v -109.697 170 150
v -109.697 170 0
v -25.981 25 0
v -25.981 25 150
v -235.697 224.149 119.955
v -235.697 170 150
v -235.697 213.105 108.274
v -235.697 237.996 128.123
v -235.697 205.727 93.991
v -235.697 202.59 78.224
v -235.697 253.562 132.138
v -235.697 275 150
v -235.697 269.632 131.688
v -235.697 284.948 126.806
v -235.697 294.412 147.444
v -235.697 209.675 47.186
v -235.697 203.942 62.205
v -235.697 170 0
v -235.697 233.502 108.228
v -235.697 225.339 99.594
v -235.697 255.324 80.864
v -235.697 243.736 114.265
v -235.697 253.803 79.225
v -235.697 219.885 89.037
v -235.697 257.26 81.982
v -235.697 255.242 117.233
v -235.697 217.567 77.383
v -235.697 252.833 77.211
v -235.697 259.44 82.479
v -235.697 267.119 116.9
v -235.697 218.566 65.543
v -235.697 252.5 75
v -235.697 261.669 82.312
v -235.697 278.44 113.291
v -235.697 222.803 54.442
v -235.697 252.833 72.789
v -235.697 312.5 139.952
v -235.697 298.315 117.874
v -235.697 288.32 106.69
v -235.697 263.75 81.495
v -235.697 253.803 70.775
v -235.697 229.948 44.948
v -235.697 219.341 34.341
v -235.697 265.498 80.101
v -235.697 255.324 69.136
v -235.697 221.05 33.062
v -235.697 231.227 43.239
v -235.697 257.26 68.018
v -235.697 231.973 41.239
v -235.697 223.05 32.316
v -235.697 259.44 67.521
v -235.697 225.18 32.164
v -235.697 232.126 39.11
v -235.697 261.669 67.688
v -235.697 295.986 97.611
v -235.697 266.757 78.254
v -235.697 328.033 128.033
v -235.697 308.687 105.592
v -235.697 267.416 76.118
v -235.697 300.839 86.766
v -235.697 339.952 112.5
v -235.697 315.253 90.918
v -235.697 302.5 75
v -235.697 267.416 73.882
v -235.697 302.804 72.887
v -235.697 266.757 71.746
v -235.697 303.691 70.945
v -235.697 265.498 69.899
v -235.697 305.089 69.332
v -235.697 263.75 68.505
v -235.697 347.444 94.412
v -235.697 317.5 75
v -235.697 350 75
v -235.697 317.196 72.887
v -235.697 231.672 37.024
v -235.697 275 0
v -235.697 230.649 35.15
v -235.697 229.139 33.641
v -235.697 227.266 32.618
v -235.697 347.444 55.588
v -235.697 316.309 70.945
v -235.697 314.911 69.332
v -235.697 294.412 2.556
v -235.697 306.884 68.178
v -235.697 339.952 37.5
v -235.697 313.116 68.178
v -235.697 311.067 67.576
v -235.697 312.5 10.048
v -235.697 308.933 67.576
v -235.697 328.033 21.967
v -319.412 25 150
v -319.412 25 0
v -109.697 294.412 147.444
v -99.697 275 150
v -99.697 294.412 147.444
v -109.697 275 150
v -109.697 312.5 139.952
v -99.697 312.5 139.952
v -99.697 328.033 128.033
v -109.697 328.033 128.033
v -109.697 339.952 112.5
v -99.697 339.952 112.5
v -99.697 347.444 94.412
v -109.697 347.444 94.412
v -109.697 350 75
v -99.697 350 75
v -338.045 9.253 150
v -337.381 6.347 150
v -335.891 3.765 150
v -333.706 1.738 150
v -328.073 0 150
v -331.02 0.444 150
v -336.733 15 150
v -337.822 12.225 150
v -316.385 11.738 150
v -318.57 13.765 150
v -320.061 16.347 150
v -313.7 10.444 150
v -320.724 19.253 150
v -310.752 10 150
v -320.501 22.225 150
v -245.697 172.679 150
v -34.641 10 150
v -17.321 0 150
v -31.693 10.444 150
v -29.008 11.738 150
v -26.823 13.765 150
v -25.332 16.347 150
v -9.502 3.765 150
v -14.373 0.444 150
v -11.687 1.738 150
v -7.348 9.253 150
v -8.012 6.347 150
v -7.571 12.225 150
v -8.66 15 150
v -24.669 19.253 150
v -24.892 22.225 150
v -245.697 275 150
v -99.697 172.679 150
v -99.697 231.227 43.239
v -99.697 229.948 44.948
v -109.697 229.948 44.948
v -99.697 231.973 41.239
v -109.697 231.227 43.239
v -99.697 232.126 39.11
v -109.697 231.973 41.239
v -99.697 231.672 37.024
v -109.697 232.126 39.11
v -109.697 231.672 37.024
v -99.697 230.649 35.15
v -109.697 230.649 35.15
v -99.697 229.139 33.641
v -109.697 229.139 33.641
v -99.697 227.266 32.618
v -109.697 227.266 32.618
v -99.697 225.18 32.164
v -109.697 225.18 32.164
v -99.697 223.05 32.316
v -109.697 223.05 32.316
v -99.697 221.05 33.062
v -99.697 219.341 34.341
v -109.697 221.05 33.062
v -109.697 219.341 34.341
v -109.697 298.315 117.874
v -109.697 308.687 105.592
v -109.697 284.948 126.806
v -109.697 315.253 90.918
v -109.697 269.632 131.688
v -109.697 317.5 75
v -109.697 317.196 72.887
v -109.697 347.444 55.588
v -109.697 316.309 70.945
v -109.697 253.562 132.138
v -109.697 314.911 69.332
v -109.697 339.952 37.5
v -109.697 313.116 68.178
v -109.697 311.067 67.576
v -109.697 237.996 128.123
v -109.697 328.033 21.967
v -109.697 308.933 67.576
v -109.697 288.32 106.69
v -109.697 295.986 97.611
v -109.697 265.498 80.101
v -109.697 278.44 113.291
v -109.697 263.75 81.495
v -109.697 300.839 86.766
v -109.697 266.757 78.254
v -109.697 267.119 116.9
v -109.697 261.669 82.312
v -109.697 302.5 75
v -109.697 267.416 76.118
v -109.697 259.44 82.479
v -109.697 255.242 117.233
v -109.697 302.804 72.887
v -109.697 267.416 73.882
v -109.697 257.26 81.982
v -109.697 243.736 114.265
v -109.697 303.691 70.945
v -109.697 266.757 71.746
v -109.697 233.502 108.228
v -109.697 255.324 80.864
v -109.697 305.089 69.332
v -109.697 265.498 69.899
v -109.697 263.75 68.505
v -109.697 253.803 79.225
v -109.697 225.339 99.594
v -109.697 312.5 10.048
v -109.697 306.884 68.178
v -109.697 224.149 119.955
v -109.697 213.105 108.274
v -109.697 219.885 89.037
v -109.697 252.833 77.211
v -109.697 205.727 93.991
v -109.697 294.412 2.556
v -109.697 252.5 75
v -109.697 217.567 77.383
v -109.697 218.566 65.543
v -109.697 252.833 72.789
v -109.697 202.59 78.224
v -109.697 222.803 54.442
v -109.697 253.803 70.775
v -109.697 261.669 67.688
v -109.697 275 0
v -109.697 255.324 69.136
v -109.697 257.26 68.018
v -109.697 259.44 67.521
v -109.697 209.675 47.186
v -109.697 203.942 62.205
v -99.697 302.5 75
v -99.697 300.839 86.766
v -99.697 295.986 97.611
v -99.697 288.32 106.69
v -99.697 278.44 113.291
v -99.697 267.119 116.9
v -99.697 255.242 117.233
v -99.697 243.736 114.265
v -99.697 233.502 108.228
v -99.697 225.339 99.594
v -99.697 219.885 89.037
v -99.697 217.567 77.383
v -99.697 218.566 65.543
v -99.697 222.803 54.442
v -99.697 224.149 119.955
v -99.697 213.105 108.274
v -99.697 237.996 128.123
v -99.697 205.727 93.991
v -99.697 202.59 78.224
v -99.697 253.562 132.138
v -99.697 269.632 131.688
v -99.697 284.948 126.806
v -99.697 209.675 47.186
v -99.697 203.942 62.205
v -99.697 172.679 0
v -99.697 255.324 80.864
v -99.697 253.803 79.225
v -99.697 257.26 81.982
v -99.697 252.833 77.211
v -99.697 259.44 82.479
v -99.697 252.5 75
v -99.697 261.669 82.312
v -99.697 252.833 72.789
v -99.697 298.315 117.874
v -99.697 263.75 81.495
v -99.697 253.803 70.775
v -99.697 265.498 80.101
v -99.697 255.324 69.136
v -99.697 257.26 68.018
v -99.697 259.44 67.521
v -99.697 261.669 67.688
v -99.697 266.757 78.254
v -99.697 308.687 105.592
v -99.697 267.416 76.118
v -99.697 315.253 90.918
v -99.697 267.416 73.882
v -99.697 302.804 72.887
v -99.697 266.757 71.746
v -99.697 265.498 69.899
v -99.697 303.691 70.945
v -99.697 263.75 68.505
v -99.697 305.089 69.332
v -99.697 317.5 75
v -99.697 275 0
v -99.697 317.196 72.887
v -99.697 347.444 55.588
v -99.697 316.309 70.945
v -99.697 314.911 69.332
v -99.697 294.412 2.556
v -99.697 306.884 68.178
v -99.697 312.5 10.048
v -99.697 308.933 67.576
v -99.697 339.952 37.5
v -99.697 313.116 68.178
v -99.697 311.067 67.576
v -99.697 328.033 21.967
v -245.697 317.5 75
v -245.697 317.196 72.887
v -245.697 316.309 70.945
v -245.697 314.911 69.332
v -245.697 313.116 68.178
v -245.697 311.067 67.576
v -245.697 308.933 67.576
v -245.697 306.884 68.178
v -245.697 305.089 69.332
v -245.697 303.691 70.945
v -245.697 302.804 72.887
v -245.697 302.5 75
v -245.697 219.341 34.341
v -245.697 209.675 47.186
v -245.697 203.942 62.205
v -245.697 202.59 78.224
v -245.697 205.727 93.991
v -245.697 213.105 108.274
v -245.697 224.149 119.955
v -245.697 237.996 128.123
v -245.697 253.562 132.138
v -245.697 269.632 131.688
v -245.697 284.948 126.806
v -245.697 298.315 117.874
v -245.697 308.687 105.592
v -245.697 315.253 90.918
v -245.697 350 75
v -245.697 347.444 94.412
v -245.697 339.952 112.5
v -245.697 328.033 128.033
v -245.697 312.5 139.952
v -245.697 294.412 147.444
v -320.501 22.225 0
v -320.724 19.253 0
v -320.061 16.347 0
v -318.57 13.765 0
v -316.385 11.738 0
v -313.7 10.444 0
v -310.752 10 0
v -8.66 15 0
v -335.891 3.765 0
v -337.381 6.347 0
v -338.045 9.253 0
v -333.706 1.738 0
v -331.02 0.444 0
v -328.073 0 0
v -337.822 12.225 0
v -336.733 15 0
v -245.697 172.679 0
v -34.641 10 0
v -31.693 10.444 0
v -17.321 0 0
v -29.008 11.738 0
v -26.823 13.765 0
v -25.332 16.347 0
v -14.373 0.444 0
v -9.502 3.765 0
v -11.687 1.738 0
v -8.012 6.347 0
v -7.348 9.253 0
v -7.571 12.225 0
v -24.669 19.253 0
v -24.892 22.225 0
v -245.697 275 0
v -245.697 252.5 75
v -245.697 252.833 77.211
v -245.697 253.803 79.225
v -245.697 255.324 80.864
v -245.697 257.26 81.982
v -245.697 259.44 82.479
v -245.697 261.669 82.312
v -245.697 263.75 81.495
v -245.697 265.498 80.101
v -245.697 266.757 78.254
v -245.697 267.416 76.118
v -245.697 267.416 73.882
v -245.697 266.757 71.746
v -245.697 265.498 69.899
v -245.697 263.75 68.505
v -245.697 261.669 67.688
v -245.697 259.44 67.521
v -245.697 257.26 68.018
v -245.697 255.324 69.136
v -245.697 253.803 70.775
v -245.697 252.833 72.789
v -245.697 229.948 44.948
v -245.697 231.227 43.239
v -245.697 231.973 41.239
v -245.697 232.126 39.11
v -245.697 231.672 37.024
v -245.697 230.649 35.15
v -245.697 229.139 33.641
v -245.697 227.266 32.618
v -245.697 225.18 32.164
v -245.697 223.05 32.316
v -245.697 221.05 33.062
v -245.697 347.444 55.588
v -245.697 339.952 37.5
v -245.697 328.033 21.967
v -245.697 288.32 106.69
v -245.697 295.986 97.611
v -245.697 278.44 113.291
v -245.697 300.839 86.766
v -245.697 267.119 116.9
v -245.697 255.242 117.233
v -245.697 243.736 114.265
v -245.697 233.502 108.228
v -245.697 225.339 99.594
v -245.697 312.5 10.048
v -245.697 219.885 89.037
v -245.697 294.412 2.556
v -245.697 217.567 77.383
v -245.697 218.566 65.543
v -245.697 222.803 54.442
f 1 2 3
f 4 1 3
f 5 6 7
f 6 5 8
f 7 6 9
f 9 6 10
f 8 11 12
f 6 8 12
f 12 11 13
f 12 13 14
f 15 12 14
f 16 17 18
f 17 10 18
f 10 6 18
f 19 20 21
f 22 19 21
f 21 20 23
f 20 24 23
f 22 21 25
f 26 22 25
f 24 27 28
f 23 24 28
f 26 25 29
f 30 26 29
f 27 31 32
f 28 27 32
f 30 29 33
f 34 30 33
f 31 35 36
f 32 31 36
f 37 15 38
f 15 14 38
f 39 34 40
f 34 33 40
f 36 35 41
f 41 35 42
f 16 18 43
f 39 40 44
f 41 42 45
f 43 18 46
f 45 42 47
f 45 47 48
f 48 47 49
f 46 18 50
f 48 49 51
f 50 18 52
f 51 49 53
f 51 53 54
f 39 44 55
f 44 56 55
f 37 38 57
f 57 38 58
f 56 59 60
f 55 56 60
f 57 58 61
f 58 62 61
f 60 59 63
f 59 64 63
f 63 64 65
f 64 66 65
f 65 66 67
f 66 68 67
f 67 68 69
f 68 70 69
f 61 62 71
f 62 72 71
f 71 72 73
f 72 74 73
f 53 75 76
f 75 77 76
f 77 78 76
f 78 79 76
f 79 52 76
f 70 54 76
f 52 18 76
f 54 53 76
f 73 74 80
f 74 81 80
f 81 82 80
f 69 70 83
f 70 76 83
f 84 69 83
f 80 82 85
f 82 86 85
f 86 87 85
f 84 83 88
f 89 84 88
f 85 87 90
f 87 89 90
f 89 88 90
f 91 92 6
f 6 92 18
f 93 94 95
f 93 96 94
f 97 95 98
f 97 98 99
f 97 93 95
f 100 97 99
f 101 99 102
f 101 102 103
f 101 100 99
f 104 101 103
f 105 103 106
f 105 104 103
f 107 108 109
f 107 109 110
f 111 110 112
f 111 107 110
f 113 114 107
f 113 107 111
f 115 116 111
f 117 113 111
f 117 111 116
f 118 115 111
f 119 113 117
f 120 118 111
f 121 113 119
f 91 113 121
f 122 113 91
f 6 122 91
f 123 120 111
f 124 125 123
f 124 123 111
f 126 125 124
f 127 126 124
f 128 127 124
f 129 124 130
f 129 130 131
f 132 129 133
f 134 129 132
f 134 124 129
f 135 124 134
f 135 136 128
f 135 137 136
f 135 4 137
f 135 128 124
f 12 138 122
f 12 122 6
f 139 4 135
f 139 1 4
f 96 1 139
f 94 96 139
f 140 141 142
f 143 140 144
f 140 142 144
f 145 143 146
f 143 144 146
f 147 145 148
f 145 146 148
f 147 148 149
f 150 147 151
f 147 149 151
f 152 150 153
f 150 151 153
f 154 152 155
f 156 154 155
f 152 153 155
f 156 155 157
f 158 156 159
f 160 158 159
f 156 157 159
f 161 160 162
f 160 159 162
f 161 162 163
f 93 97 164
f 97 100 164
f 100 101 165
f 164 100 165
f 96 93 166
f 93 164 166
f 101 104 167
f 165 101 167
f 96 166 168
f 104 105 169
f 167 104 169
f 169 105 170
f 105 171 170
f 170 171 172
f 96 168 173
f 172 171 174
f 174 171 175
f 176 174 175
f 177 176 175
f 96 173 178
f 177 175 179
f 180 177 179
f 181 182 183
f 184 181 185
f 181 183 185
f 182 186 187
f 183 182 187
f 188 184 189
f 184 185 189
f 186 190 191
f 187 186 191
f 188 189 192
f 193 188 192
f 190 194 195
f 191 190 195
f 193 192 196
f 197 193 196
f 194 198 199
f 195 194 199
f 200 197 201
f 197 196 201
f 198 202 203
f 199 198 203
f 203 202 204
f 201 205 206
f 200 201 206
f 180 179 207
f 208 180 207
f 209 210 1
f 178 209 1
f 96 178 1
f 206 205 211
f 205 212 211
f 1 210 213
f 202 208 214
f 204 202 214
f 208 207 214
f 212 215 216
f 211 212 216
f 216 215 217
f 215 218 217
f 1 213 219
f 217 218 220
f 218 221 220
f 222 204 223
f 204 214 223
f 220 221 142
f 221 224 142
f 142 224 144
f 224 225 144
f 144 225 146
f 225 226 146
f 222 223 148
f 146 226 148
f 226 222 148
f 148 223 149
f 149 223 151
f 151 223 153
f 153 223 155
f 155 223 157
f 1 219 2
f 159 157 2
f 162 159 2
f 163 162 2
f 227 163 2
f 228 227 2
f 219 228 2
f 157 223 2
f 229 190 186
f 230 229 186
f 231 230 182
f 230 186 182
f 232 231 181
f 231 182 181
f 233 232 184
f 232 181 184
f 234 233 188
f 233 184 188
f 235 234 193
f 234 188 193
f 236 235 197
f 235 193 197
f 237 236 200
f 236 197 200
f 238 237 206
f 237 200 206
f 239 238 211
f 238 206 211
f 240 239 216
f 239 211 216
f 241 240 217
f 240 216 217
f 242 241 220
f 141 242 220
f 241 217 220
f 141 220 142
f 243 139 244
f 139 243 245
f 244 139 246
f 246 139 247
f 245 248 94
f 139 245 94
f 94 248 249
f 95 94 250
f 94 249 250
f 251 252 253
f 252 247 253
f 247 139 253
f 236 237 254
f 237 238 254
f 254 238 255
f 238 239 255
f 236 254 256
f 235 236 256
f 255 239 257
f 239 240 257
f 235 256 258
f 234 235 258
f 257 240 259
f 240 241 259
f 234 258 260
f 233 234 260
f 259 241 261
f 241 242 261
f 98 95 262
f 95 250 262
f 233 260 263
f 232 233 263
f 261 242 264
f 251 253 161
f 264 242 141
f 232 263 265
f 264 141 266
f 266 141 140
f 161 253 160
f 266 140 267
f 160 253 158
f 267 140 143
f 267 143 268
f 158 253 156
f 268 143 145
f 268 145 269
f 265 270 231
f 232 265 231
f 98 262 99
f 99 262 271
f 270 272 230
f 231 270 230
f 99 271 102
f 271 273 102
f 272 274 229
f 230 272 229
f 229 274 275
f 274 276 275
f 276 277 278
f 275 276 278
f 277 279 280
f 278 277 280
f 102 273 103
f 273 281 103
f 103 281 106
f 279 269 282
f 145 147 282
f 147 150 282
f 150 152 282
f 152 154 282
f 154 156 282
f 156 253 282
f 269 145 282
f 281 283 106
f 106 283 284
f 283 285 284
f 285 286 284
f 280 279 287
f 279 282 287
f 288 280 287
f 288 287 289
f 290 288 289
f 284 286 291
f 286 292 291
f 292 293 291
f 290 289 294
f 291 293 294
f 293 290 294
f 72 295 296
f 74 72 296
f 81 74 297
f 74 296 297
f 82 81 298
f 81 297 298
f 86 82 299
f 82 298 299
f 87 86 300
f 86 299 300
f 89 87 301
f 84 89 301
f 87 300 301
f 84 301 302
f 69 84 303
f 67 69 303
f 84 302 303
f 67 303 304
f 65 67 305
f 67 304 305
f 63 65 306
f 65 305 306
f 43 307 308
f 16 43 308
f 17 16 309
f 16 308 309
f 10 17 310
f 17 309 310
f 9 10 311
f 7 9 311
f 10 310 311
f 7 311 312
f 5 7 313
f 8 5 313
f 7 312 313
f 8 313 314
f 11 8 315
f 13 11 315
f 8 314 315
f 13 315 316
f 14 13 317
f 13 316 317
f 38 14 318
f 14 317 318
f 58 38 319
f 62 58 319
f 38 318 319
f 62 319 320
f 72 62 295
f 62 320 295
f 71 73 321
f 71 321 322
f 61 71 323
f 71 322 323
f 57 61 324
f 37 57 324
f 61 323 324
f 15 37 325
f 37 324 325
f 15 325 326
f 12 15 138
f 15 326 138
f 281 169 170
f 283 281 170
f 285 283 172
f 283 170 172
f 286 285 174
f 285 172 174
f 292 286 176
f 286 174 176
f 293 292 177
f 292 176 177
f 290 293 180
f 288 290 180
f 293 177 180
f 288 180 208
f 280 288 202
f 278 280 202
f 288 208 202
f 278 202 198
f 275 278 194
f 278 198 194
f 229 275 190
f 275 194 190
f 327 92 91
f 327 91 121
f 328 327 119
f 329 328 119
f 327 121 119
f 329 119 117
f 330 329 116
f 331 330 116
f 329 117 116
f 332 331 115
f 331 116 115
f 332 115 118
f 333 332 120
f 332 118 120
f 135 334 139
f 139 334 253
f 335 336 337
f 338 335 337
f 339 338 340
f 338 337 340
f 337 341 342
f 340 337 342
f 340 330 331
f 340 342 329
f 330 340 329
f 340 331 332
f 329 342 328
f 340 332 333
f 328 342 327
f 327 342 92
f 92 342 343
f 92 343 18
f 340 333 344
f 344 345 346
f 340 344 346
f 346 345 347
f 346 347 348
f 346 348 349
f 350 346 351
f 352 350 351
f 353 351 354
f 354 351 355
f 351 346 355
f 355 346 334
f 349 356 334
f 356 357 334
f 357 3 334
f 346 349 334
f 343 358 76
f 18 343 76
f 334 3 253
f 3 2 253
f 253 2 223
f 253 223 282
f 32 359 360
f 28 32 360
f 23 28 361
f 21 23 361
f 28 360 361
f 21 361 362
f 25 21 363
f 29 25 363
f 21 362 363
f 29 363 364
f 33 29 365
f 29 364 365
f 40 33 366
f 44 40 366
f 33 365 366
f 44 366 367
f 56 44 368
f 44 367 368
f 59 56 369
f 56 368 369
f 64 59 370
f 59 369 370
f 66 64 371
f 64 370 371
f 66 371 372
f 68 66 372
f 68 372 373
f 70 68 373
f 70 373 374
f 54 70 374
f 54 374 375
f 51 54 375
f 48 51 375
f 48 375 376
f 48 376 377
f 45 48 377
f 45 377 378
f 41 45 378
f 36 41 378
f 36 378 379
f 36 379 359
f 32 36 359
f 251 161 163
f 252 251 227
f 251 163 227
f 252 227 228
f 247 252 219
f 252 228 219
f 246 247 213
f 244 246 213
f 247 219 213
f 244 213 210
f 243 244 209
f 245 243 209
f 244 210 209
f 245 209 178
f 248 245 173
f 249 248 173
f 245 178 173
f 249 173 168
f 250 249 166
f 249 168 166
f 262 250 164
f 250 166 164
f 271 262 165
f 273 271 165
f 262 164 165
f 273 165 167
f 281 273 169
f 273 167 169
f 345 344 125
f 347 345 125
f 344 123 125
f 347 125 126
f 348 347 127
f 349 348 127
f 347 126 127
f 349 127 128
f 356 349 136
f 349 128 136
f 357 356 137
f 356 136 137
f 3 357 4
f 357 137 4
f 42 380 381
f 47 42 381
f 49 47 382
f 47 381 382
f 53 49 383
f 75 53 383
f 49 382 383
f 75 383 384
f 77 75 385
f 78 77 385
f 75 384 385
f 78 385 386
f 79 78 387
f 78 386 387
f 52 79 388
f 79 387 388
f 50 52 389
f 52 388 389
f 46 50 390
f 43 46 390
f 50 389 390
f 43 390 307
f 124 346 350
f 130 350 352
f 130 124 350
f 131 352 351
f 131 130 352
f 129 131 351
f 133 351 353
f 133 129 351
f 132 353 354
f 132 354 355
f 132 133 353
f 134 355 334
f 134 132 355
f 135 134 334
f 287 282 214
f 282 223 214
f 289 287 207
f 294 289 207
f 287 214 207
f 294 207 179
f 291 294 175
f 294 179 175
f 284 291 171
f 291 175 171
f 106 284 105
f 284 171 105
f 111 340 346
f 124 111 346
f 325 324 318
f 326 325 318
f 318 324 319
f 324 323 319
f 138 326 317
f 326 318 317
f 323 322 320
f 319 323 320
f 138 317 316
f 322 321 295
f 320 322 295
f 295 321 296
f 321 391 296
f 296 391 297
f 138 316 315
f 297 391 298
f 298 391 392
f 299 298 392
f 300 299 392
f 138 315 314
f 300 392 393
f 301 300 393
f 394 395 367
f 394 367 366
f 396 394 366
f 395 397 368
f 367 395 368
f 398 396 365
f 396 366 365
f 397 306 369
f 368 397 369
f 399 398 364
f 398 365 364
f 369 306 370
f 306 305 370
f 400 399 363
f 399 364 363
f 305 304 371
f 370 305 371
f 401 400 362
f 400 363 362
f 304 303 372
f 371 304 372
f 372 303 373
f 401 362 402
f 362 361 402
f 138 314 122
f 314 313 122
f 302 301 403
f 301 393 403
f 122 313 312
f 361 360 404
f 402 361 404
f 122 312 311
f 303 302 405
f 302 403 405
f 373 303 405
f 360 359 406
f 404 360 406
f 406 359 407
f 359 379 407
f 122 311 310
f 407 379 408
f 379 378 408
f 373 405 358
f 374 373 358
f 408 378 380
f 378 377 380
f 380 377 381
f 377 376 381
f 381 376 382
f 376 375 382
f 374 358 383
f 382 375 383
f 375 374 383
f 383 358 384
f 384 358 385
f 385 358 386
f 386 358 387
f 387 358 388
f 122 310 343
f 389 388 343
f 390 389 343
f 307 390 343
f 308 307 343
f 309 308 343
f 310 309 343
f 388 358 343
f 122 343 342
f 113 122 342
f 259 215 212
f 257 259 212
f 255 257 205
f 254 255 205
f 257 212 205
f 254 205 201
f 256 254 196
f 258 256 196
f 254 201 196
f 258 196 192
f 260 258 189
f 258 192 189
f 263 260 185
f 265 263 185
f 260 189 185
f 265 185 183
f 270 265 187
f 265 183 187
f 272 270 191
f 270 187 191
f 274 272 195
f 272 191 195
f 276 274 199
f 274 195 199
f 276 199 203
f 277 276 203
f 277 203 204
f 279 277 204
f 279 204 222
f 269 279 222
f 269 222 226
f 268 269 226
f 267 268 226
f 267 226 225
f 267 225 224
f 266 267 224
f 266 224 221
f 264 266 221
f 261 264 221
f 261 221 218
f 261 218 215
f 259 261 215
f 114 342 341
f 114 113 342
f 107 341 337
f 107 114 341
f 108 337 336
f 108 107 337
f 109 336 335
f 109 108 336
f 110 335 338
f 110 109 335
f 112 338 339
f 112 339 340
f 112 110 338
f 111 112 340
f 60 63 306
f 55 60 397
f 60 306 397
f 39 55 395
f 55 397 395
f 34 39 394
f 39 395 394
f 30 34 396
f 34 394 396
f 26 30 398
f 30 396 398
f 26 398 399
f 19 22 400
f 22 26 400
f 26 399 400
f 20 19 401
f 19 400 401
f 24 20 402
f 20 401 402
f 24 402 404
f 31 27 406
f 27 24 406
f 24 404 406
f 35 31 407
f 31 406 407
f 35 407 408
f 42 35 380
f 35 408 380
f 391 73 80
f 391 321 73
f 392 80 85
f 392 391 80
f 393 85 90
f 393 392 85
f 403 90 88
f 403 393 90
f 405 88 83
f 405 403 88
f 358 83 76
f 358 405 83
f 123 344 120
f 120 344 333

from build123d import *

# Parameters (mm, degrees)
SALIENTE_EXTRUIR1_DEPTH = 150
CROQUIS2_R              = 7.5
CORTAR_EXTRUIR1_DEPTH   = 146
REDONDEO1_R             = 75
REDONDEO2_R             = 10


with BuildPart() as part:
    # Croquis1 → Saliente-Extruir1 (new body)
    with BuildSketch(Plane.XY):
        Polygon((-245.696551146, 350), (-245.696551146, 172.679491924), (-345.393102292, 0), (0, 0), (-99.696551146, 172.679491924), (-99.696551146, 350), (-109.696551146, 350), (-109.696551146, 170), (-17.320508076, 10), (-328.072594216, 10), (-235.696551146, 170), (-235.696551146, 350), align=None)
    extrude(amount=SALIENTE_EXTRUIR1_DEPTH)

    # Croquis2 → Cortar-Extruir1 (cut)
    with BuildSketch(Plane.ZY.offset(245.696551146)):
        with Locations(Location((75, 260, 0), (0, 0, 270))):
            Circle(CROQUIS2_R)
        with BuildLine():
            ThreePointArc((34.341360082, 219.341360082), (128.123073119, 237.995702639), (75, 317.5))
            ThreePointArc((75, 317.5), (67.5, 310), (75, 302.5))
            ThreePointArc((75, 302.5), (114.264880132, 243.735954124), (44.9479618, 229.9479618))
            ThreePointArc((44.9479618, 229.9479618), (34.341360082, 229.9479618), (34.341360082, 219.341360082))
        make_face()
    extrude(amount=-CORTAR_EXTRUIR1_DEPTH, mode=Mode.SUBTRACT)

    # Redondeo1
    redondeo1_edges = [part.edges().sort_by_distance(p)[0] for p in [
        (-104.696551146, 350, 0),
        (-104.696551146, 350, 150),
        (-240.696551146, 350, 150),
        (-240.696551146, 350, 0),
    ]]
    fillet(redondeo1_edges, radius=REDONDEO1_R - 0.0001)  # a hair under: the kernel refuses the full size

    # Redondeo2
    redondeo2_edges = [part.edges().sort_by_distance(p)[0] for p in [
        (-328.072594216, 10, 75),
        (-17.320508076, 10, 75),
        (0, 0, 75),
        (-345.393102292, 0, 75),
    ]]
    fillet(redondeo2_edges, radius=REDONDEO2_R)


solid = part.part
